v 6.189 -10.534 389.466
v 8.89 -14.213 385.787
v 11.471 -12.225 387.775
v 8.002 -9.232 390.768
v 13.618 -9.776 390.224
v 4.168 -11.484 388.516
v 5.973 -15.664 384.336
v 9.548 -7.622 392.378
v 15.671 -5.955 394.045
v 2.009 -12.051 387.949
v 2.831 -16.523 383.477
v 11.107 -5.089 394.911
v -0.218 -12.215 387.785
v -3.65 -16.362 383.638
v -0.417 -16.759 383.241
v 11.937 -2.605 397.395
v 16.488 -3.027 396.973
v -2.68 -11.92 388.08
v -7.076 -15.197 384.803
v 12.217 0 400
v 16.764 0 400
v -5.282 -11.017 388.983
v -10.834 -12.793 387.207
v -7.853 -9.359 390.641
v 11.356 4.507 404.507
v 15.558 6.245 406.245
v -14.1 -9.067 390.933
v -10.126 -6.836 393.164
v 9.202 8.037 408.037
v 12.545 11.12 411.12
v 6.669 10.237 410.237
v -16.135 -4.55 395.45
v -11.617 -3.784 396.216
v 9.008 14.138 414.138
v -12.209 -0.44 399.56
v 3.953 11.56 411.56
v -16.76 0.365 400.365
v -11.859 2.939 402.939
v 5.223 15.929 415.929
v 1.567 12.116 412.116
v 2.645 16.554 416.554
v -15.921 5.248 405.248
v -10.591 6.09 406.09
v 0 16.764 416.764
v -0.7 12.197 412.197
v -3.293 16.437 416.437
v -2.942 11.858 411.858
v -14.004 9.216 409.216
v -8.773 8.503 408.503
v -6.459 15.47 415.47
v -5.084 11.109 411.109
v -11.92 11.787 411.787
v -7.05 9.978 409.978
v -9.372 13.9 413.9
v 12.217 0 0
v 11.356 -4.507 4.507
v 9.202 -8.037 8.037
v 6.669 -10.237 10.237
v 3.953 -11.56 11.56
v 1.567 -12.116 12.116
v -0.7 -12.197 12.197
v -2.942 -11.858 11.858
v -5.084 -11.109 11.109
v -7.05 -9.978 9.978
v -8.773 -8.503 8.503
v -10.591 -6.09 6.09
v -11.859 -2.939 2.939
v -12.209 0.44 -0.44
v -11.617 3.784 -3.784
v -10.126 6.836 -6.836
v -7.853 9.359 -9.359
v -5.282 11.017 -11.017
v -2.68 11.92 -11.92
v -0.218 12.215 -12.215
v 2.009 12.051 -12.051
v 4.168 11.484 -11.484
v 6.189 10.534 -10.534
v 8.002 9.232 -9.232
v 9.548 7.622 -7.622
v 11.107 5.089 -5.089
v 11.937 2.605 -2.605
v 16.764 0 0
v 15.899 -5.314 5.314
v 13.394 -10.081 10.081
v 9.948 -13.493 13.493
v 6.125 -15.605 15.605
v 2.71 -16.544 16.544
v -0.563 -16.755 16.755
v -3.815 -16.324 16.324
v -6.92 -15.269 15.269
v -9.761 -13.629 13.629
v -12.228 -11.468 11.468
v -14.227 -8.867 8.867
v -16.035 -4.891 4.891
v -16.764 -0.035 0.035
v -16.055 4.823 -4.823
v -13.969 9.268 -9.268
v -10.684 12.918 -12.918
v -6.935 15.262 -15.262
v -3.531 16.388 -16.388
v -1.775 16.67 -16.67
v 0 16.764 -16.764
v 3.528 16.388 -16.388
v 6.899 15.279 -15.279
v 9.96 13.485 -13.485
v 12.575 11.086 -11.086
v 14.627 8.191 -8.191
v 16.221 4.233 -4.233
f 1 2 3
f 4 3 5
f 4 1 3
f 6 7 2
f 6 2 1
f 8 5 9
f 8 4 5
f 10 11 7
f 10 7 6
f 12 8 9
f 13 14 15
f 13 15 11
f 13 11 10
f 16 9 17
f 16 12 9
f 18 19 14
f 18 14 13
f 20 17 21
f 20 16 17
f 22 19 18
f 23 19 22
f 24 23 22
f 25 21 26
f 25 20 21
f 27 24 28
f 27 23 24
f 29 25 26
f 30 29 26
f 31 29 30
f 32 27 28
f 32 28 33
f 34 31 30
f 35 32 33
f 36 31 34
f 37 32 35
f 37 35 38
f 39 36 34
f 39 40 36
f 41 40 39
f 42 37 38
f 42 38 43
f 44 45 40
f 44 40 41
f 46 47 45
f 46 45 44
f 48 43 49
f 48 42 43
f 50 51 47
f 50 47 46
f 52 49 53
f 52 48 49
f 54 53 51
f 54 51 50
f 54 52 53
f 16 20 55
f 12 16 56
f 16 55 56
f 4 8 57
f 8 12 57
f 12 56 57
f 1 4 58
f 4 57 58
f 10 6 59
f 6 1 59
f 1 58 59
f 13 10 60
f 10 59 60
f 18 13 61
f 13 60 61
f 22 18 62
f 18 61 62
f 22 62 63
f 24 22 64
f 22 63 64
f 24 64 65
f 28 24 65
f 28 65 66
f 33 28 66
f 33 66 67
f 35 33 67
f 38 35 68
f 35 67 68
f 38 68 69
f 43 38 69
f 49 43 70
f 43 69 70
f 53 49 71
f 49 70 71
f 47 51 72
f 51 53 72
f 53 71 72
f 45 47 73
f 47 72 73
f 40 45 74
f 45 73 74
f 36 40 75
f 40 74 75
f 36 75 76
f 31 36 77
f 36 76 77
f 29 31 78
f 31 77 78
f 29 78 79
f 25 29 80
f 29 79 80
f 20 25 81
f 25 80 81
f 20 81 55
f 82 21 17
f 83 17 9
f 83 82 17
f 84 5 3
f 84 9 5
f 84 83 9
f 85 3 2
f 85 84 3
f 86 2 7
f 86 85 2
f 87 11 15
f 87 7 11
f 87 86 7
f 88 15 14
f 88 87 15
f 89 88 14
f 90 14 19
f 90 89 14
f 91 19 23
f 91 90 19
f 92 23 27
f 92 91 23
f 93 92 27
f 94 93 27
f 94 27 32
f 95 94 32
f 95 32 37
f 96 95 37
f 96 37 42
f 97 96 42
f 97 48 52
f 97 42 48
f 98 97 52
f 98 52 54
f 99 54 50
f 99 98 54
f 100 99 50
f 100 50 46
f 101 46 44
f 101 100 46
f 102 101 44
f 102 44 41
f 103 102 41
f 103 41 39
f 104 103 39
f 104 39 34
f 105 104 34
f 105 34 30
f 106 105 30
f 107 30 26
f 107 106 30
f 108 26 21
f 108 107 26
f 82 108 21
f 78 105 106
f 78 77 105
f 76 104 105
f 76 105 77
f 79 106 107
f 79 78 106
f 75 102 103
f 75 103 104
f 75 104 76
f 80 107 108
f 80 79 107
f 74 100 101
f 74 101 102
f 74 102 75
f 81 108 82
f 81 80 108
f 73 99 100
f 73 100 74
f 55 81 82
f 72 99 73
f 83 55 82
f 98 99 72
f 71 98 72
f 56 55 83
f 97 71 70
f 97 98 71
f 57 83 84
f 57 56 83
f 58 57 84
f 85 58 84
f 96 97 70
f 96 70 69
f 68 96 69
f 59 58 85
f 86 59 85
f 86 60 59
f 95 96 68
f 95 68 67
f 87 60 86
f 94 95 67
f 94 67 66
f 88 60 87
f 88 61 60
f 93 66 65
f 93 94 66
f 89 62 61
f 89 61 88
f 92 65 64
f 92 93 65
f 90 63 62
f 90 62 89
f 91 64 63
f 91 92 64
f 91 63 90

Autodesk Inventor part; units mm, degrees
ref_plane "Start Plane" through (0, 0, -16.764) normal (0, 0, 1) x (1, 0, 0)
ref_plane "End Plane" through (0, 0, 416.764) normal (0, 0, 1) x (1, 0, 0)
sketch "Sketch" plane through (0, 0, 0) normal (0, 0, 1) x (1, 0, 0)
  circle A0 centre (0, 0) radius 12.2174
  circle A1 centre (0, 0) radius 16.764
  dimension "d0" = 33.528
  dimension "d1" = 4.5466
extrude "Body" add sketch "Sketch" along normal up to surface (433.528 mm away) from surface at -16.764
sketch "Sketch3" plane through (0, 0, 0) normal (0, 0, 1) x (1, 0, 0)
  line L0 (0, 0) -> (10, 0)
ref_plane "Work Plane3" through (0, 0, 0) normal (0, -1, 0) x (1, 0, 0)
ref_plane "Work Plane4" through (0, 16.764, 416.764) normal (0, -0.7071, 0.7071) x (1, 0, 0)
split "Split1" plane through (0, 16.764, 416.764) removes the side toward (0, -0.7071, 0.7071)
ref_plane "Work Plane5" through (0, 16.764, -16.764) normal (0, -0.7071, -0.7071) x (1, 0, 0)
split "Split2" plane through (0, 16.764, -16.764) removes the side toward (0, -0.7071, -0.7071)
sketch "Sketch4" plane through (0, 0, 0) normal (0, -1, 0) x (1, 0, 0)
  line L0 (-2, -16.764) -> (12, -16.764) projected
  line L1 (-2, 416.764) -> (12, 416.764) projected
  dimension "d7" = 433.528
equation "\"d0\" = G_H"
equation "\"d1\" = G_T"
equation "\"d2\" = G_L"
equation "\"G_H\" = 33.528"
equation "\"G_T\" = 4.5466"
equation "\"G_L\" = d7"
equation "\"G_OFFSET_START\" = 16.764"
equation "\"G_OFFSET_END\" = 16.764"
equation "\"d4\" = -G_OFFSET_START"
equation "\"d5\" = G_OFFSET_END + B_L"
equation "\"B_L\" = 400"
properties part number "ANSI - 1 x 0.179 - 17.068" material "Steel, Mild"
